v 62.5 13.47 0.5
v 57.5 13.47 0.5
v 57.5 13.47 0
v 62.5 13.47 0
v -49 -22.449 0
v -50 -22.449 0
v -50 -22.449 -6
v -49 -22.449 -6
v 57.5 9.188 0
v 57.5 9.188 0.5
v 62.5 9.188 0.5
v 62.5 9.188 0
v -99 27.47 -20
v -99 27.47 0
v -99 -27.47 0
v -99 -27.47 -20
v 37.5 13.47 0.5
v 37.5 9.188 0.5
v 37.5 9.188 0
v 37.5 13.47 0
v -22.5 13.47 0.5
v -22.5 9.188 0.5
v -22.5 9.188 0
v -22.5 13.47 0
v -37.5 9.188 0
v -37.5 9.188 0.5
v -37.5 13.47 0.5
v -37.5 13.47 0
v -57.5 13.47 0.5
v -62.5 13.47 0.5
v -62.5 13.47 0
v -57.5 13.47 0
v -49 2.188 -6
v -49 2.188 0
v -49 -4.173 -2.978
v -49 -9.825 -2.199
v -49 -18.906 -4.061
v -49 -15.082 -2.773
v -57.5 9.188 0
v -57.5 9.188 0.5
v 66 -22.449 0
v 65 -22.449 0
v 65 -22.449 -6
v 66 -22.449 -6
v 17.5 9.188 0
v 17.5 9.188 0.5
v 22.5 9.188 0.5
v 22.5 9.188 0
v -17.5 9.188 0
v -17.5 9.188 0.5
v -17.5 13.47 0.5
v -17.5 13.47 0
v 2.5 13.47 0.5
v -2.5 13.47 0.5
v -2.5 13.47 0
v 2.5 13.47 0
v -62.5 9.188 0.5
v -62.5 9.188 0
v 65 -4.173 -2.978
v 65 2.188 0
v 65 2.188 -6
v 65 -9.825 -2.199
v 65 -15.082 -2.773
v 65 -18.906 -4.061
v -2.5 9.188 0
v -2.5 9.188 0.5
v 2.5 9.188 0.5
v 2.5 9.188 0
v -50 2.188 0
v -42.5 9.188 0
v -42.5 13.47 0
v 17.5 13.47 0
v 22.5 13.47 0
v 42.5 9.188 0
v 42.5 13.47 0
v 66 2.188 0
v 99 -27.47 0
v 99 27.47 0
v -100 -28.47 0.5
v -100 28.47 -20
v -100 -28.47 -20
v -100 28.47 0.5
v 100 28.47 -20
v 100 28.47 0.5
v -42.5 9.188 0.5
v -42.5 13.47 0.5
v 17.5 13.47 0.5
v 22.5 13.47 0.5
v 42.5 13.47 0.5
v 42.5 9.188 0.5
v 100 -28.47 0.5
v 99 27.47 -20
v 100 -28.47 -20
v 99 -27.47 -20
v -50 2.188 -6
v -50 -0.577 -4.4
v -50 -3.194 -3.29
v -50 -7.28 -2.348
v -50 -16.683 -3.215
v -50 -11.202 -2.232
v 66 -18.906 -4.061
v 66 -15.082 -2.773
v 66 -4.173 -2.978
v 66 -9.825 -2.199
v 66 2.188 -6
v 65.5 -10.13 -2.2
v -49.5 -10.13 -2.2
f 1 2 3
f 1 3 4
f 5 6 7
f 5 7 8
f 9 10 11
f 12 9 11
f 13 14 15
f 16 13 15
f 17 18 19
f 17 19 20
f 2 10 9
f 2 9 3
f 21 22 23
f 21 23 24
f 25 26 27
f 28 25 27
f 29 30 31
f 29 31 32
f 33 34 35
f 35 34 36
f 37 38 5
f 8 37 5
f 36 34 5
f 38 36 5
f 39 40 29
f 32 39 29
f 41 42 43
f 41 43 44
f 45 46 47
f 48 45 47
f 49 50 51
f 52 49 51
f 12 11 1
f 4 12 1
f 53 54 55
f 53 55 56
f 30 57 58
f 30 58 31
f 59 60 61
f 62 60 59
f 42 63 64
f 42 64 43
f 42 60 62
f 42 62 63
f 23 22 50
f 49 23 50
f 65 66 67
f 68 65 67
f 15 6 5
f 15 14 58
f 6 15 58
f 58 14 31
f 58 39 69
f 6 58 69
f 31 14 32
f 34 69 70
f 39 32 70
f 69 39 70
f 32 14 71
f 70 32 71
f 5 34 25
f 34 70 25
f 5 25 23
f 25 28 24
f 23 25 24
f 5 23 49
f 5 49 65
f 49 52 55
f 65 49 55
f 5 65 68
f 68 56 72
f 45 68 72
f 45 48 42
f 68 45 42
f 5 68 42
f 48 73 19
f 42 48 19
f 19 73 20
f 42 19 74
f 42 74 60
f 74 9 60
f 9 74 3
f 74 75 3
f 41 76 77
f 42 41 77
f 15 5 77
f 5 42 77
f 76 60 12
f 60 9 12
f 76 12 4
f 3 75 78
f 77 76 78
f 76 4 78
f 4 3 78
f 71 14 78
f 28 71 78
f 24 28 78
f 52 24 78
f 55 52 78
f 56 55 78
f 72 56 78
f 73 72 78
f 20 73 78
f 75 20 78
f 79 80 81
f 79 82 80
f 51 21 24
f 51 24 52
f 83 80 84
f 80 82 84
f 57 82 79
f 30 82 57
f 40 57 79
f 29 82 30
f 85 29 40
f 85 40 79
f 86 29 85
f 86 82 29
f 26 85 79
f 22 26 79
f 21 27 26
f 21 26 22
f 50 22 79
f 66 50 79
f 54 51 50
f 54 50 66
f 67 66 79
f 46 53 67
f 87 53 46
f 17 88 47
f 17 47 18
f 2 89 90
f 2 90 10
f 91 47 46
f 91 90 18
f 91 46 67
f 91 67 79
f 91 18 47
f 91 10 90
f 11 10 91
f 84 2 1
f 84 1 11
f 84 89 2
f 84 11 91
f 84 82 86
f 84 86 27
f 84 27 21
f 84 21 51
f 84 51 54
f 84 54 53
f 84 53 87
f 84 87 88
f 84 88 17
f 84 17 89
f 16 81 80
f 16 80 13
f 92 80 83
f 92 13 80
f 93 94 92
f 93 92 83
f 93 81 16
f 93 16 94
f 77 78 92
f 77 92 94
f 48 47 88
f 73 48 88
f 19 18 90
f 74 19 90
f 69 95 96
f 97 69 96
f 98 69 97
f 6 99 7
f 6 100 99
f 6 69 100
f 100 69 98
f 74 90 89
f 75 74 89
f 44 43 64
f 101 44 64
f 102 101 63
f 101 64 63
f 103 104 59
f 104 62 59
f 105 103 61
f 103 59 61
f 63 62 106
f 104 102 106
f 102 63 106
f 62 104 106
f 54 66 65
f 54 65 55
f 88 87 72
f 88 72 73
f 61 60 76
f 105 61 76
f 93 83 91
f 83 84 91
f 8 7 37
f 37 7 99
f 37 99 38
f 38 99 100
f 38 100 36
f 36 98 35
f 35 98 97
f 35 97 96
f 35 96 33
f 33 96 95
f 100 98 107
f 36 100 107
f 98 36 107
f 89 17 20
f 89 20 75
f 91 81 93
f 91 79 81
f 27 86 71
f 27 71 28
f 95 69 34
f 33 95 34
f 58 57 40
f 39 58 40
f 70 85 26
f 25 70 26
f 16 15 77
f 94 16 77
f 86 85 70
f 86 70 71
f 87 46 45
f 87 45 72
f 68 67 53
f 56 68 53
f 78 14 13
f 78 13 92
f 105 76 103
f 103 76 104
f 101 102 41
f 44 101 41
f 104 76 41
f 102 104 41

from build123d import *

# Parameters (mm, degrees)
F0_W      = 200
F0_H      = 56.94
F0_W_2    = 5
F0_H_2    = 4.2824763805
F1_DEPTH  = 0.5
F2_DEPTH  = 0.501
F3_W      = 1
F3_H      = 24.6360383326
F4_DEPTH  = 6
F6_DEPTH  = 150.001
F8_W      = 1
F8_H      = 56.94
F9_DEPTH  = 20
F7_W      = 1
F7_H      = 56.94
F10_DEPTH = 20
F11_W     = 198
F11_H     = 1
F12_DEPTH = 20
F13_W     = 198
F13_H     = 1
F14_DEPTH = 20


with BuildPart() as f1:
    # F0 (on Top) → F1 (new body, symmetric)
    with BuildSketch(Plane.XY):
        Rectangle(F0_W, F0_H)
        with Locations((-60, 11.3287618098)):
            Rectangle(F0_W_2, F0_H_2, mode=Mode.SUBTRACT)
        with Locations((-40, 11.3287618098)):
            Rectangle(F0_W_2, F0_H_2, mode=Mode.SUBTRACT)
        with Locations((-20, 11.3287618098)):
            Rectangle(F0_W_2, F0_H_2, mode=Mode.SUBTRACT)
        with Locations((0, 11.3287618098)):
            Rectangle(F0_W_2, F0_H_2, mode=Mode.SUBTRACT)
        with Locations((20, 11.3287618098)):
            Rectangle(F0_W_2, F0_H_2, mode=Mode.SUBTRACT)
        with Locations((40, 11.3287618098)):
            Rectangle(F0_W_2, F0_H_2, mode=Mode.SUBTRACT)
        with Locations((60, 11.3287618098)):
            Rectangle(F0_W_2, F0_H_2, mode=Mode.SUBTRACT)
    extrude(amount=F1_DEPTH, both=True)

    # F0 (on Top) → F2 (cut, through all)
    with BuildSketch(Plane.XY):
        Rectangle(F0_W, F0_H)
        with Locations((-60, 11.3287618098)):
            Rectangle(F0_W_2, F0_H_2, mode=Mode.SUBTRACT)
        with Locations((-40, 11.3287618098)):
            Rectangle(F0_W_2, F0_H_2, mode=Mode.SUBTRACT)
        with Locations((-20, 11.3287618098)):
            Rectangle(F0_W_2, F0_H_2, mode=Mode.SUBTRACT)
        with Locations((0, 11.3287618098)):
            Rectangle(F0_W_2, F0_H_2, mode=Mode.SUBTRACT)
        with Locations((20, 11.3287618098)):
            Rectangle(F0_W_2, F0_H_2, mode=Mode.SUBTRACT)
        with Locations((40, 11.3287618098)):
            Rectangle(F0_W_2, F0_H_2, mode=Mode.SUBTRACT)
        with Locations((60, 11.3287618098)):
            Rectangle(F0_W_2, F0_H_2, mode=Mode.SUBTRACT)
    extrude(amount=-F2_DEPTH, mode=Mode.SUBTRACT)

    # F3 (on face) → F4 (join)
    with BuildSketch(Plane(origin=(0, 0, 0), x_dir=(1, 0, 0), z_dir=(0, 0, -1))):
        with Locations((-49.5, 10.1304955468)):
            Rectangle(F3_W, F3_H)
        with Locations((65.5, 10.1304955468)):
            Rectangle(F3_W, F3_H)
    extrude(amount=F4_DEPTH)

    # F5 (on face) → F6 (cut, through all)
    with BuildSketch(Plane(origin=(-50, 0, 0), x_dir=(0, -1, 0), z_dir=(-1, 0, 0))):
        with BuildLine():
            Line((-2.1875236195, -6), (22.448514713, -6))
            add(Edge.make_bspline(
                [(22.448514713, -6), (18.0848203599, -3.1530638225), (10.0274980374, -1.3176856102), (2.3821657524, -3.011564957), (-2.1875236195, -6)],
                knots=[0, 0, 0, 0, 0.5, 1, 1, 1, 1], degree=3))
        make_face()
    extrude(amount=-F6_DEPTH, mode=Mode.SUBTRACT)

    # F8 (on face) → F9 (join)
    with BuildSketch(Plane(origin=(0, 0, 0), x_dir=(1, 0, 0), z_dir=(0, 0, -1))):
        with Locations((99.5, 0)):
            Rectangle(F8_W, F8_H)
    extrude(amount=F9_DEPTH)

    # F7 (on face) → F10 (join)
    with BuildSketch(Plane(origin=(0, 0, 0), x_dir=(1, 0, 0), z_dir=(0, 0, -1))):
        with Locations((-99.5, 0)):
            Rectangle(F7_W, F7_H)
    extrude(amount=F10_DEPTH)

    # F11 (on face) → F12 (join)
    with BuildSketch(Plane(origin=(0, 0, 0), x_dir=(1, 0, 0), z_dir=(0, 0, -1))):
        with Locations((0, 27.97)):
            Rectangle(F11_W, F11_H)
    extrude(amount=F12_DEPTH)

    # F13 (on face) → F14 (join)
    with BuildSketch(Plane(origin=(0, 0, 0), x_dir=(1, 0, 0), z_dir=(0, 0, -1))):
        with Locations((0, -27.97)):
            Rectangle(F13_W, F13_H)
    extrude(amount=F14_DEPTH)


solid = f1.part
